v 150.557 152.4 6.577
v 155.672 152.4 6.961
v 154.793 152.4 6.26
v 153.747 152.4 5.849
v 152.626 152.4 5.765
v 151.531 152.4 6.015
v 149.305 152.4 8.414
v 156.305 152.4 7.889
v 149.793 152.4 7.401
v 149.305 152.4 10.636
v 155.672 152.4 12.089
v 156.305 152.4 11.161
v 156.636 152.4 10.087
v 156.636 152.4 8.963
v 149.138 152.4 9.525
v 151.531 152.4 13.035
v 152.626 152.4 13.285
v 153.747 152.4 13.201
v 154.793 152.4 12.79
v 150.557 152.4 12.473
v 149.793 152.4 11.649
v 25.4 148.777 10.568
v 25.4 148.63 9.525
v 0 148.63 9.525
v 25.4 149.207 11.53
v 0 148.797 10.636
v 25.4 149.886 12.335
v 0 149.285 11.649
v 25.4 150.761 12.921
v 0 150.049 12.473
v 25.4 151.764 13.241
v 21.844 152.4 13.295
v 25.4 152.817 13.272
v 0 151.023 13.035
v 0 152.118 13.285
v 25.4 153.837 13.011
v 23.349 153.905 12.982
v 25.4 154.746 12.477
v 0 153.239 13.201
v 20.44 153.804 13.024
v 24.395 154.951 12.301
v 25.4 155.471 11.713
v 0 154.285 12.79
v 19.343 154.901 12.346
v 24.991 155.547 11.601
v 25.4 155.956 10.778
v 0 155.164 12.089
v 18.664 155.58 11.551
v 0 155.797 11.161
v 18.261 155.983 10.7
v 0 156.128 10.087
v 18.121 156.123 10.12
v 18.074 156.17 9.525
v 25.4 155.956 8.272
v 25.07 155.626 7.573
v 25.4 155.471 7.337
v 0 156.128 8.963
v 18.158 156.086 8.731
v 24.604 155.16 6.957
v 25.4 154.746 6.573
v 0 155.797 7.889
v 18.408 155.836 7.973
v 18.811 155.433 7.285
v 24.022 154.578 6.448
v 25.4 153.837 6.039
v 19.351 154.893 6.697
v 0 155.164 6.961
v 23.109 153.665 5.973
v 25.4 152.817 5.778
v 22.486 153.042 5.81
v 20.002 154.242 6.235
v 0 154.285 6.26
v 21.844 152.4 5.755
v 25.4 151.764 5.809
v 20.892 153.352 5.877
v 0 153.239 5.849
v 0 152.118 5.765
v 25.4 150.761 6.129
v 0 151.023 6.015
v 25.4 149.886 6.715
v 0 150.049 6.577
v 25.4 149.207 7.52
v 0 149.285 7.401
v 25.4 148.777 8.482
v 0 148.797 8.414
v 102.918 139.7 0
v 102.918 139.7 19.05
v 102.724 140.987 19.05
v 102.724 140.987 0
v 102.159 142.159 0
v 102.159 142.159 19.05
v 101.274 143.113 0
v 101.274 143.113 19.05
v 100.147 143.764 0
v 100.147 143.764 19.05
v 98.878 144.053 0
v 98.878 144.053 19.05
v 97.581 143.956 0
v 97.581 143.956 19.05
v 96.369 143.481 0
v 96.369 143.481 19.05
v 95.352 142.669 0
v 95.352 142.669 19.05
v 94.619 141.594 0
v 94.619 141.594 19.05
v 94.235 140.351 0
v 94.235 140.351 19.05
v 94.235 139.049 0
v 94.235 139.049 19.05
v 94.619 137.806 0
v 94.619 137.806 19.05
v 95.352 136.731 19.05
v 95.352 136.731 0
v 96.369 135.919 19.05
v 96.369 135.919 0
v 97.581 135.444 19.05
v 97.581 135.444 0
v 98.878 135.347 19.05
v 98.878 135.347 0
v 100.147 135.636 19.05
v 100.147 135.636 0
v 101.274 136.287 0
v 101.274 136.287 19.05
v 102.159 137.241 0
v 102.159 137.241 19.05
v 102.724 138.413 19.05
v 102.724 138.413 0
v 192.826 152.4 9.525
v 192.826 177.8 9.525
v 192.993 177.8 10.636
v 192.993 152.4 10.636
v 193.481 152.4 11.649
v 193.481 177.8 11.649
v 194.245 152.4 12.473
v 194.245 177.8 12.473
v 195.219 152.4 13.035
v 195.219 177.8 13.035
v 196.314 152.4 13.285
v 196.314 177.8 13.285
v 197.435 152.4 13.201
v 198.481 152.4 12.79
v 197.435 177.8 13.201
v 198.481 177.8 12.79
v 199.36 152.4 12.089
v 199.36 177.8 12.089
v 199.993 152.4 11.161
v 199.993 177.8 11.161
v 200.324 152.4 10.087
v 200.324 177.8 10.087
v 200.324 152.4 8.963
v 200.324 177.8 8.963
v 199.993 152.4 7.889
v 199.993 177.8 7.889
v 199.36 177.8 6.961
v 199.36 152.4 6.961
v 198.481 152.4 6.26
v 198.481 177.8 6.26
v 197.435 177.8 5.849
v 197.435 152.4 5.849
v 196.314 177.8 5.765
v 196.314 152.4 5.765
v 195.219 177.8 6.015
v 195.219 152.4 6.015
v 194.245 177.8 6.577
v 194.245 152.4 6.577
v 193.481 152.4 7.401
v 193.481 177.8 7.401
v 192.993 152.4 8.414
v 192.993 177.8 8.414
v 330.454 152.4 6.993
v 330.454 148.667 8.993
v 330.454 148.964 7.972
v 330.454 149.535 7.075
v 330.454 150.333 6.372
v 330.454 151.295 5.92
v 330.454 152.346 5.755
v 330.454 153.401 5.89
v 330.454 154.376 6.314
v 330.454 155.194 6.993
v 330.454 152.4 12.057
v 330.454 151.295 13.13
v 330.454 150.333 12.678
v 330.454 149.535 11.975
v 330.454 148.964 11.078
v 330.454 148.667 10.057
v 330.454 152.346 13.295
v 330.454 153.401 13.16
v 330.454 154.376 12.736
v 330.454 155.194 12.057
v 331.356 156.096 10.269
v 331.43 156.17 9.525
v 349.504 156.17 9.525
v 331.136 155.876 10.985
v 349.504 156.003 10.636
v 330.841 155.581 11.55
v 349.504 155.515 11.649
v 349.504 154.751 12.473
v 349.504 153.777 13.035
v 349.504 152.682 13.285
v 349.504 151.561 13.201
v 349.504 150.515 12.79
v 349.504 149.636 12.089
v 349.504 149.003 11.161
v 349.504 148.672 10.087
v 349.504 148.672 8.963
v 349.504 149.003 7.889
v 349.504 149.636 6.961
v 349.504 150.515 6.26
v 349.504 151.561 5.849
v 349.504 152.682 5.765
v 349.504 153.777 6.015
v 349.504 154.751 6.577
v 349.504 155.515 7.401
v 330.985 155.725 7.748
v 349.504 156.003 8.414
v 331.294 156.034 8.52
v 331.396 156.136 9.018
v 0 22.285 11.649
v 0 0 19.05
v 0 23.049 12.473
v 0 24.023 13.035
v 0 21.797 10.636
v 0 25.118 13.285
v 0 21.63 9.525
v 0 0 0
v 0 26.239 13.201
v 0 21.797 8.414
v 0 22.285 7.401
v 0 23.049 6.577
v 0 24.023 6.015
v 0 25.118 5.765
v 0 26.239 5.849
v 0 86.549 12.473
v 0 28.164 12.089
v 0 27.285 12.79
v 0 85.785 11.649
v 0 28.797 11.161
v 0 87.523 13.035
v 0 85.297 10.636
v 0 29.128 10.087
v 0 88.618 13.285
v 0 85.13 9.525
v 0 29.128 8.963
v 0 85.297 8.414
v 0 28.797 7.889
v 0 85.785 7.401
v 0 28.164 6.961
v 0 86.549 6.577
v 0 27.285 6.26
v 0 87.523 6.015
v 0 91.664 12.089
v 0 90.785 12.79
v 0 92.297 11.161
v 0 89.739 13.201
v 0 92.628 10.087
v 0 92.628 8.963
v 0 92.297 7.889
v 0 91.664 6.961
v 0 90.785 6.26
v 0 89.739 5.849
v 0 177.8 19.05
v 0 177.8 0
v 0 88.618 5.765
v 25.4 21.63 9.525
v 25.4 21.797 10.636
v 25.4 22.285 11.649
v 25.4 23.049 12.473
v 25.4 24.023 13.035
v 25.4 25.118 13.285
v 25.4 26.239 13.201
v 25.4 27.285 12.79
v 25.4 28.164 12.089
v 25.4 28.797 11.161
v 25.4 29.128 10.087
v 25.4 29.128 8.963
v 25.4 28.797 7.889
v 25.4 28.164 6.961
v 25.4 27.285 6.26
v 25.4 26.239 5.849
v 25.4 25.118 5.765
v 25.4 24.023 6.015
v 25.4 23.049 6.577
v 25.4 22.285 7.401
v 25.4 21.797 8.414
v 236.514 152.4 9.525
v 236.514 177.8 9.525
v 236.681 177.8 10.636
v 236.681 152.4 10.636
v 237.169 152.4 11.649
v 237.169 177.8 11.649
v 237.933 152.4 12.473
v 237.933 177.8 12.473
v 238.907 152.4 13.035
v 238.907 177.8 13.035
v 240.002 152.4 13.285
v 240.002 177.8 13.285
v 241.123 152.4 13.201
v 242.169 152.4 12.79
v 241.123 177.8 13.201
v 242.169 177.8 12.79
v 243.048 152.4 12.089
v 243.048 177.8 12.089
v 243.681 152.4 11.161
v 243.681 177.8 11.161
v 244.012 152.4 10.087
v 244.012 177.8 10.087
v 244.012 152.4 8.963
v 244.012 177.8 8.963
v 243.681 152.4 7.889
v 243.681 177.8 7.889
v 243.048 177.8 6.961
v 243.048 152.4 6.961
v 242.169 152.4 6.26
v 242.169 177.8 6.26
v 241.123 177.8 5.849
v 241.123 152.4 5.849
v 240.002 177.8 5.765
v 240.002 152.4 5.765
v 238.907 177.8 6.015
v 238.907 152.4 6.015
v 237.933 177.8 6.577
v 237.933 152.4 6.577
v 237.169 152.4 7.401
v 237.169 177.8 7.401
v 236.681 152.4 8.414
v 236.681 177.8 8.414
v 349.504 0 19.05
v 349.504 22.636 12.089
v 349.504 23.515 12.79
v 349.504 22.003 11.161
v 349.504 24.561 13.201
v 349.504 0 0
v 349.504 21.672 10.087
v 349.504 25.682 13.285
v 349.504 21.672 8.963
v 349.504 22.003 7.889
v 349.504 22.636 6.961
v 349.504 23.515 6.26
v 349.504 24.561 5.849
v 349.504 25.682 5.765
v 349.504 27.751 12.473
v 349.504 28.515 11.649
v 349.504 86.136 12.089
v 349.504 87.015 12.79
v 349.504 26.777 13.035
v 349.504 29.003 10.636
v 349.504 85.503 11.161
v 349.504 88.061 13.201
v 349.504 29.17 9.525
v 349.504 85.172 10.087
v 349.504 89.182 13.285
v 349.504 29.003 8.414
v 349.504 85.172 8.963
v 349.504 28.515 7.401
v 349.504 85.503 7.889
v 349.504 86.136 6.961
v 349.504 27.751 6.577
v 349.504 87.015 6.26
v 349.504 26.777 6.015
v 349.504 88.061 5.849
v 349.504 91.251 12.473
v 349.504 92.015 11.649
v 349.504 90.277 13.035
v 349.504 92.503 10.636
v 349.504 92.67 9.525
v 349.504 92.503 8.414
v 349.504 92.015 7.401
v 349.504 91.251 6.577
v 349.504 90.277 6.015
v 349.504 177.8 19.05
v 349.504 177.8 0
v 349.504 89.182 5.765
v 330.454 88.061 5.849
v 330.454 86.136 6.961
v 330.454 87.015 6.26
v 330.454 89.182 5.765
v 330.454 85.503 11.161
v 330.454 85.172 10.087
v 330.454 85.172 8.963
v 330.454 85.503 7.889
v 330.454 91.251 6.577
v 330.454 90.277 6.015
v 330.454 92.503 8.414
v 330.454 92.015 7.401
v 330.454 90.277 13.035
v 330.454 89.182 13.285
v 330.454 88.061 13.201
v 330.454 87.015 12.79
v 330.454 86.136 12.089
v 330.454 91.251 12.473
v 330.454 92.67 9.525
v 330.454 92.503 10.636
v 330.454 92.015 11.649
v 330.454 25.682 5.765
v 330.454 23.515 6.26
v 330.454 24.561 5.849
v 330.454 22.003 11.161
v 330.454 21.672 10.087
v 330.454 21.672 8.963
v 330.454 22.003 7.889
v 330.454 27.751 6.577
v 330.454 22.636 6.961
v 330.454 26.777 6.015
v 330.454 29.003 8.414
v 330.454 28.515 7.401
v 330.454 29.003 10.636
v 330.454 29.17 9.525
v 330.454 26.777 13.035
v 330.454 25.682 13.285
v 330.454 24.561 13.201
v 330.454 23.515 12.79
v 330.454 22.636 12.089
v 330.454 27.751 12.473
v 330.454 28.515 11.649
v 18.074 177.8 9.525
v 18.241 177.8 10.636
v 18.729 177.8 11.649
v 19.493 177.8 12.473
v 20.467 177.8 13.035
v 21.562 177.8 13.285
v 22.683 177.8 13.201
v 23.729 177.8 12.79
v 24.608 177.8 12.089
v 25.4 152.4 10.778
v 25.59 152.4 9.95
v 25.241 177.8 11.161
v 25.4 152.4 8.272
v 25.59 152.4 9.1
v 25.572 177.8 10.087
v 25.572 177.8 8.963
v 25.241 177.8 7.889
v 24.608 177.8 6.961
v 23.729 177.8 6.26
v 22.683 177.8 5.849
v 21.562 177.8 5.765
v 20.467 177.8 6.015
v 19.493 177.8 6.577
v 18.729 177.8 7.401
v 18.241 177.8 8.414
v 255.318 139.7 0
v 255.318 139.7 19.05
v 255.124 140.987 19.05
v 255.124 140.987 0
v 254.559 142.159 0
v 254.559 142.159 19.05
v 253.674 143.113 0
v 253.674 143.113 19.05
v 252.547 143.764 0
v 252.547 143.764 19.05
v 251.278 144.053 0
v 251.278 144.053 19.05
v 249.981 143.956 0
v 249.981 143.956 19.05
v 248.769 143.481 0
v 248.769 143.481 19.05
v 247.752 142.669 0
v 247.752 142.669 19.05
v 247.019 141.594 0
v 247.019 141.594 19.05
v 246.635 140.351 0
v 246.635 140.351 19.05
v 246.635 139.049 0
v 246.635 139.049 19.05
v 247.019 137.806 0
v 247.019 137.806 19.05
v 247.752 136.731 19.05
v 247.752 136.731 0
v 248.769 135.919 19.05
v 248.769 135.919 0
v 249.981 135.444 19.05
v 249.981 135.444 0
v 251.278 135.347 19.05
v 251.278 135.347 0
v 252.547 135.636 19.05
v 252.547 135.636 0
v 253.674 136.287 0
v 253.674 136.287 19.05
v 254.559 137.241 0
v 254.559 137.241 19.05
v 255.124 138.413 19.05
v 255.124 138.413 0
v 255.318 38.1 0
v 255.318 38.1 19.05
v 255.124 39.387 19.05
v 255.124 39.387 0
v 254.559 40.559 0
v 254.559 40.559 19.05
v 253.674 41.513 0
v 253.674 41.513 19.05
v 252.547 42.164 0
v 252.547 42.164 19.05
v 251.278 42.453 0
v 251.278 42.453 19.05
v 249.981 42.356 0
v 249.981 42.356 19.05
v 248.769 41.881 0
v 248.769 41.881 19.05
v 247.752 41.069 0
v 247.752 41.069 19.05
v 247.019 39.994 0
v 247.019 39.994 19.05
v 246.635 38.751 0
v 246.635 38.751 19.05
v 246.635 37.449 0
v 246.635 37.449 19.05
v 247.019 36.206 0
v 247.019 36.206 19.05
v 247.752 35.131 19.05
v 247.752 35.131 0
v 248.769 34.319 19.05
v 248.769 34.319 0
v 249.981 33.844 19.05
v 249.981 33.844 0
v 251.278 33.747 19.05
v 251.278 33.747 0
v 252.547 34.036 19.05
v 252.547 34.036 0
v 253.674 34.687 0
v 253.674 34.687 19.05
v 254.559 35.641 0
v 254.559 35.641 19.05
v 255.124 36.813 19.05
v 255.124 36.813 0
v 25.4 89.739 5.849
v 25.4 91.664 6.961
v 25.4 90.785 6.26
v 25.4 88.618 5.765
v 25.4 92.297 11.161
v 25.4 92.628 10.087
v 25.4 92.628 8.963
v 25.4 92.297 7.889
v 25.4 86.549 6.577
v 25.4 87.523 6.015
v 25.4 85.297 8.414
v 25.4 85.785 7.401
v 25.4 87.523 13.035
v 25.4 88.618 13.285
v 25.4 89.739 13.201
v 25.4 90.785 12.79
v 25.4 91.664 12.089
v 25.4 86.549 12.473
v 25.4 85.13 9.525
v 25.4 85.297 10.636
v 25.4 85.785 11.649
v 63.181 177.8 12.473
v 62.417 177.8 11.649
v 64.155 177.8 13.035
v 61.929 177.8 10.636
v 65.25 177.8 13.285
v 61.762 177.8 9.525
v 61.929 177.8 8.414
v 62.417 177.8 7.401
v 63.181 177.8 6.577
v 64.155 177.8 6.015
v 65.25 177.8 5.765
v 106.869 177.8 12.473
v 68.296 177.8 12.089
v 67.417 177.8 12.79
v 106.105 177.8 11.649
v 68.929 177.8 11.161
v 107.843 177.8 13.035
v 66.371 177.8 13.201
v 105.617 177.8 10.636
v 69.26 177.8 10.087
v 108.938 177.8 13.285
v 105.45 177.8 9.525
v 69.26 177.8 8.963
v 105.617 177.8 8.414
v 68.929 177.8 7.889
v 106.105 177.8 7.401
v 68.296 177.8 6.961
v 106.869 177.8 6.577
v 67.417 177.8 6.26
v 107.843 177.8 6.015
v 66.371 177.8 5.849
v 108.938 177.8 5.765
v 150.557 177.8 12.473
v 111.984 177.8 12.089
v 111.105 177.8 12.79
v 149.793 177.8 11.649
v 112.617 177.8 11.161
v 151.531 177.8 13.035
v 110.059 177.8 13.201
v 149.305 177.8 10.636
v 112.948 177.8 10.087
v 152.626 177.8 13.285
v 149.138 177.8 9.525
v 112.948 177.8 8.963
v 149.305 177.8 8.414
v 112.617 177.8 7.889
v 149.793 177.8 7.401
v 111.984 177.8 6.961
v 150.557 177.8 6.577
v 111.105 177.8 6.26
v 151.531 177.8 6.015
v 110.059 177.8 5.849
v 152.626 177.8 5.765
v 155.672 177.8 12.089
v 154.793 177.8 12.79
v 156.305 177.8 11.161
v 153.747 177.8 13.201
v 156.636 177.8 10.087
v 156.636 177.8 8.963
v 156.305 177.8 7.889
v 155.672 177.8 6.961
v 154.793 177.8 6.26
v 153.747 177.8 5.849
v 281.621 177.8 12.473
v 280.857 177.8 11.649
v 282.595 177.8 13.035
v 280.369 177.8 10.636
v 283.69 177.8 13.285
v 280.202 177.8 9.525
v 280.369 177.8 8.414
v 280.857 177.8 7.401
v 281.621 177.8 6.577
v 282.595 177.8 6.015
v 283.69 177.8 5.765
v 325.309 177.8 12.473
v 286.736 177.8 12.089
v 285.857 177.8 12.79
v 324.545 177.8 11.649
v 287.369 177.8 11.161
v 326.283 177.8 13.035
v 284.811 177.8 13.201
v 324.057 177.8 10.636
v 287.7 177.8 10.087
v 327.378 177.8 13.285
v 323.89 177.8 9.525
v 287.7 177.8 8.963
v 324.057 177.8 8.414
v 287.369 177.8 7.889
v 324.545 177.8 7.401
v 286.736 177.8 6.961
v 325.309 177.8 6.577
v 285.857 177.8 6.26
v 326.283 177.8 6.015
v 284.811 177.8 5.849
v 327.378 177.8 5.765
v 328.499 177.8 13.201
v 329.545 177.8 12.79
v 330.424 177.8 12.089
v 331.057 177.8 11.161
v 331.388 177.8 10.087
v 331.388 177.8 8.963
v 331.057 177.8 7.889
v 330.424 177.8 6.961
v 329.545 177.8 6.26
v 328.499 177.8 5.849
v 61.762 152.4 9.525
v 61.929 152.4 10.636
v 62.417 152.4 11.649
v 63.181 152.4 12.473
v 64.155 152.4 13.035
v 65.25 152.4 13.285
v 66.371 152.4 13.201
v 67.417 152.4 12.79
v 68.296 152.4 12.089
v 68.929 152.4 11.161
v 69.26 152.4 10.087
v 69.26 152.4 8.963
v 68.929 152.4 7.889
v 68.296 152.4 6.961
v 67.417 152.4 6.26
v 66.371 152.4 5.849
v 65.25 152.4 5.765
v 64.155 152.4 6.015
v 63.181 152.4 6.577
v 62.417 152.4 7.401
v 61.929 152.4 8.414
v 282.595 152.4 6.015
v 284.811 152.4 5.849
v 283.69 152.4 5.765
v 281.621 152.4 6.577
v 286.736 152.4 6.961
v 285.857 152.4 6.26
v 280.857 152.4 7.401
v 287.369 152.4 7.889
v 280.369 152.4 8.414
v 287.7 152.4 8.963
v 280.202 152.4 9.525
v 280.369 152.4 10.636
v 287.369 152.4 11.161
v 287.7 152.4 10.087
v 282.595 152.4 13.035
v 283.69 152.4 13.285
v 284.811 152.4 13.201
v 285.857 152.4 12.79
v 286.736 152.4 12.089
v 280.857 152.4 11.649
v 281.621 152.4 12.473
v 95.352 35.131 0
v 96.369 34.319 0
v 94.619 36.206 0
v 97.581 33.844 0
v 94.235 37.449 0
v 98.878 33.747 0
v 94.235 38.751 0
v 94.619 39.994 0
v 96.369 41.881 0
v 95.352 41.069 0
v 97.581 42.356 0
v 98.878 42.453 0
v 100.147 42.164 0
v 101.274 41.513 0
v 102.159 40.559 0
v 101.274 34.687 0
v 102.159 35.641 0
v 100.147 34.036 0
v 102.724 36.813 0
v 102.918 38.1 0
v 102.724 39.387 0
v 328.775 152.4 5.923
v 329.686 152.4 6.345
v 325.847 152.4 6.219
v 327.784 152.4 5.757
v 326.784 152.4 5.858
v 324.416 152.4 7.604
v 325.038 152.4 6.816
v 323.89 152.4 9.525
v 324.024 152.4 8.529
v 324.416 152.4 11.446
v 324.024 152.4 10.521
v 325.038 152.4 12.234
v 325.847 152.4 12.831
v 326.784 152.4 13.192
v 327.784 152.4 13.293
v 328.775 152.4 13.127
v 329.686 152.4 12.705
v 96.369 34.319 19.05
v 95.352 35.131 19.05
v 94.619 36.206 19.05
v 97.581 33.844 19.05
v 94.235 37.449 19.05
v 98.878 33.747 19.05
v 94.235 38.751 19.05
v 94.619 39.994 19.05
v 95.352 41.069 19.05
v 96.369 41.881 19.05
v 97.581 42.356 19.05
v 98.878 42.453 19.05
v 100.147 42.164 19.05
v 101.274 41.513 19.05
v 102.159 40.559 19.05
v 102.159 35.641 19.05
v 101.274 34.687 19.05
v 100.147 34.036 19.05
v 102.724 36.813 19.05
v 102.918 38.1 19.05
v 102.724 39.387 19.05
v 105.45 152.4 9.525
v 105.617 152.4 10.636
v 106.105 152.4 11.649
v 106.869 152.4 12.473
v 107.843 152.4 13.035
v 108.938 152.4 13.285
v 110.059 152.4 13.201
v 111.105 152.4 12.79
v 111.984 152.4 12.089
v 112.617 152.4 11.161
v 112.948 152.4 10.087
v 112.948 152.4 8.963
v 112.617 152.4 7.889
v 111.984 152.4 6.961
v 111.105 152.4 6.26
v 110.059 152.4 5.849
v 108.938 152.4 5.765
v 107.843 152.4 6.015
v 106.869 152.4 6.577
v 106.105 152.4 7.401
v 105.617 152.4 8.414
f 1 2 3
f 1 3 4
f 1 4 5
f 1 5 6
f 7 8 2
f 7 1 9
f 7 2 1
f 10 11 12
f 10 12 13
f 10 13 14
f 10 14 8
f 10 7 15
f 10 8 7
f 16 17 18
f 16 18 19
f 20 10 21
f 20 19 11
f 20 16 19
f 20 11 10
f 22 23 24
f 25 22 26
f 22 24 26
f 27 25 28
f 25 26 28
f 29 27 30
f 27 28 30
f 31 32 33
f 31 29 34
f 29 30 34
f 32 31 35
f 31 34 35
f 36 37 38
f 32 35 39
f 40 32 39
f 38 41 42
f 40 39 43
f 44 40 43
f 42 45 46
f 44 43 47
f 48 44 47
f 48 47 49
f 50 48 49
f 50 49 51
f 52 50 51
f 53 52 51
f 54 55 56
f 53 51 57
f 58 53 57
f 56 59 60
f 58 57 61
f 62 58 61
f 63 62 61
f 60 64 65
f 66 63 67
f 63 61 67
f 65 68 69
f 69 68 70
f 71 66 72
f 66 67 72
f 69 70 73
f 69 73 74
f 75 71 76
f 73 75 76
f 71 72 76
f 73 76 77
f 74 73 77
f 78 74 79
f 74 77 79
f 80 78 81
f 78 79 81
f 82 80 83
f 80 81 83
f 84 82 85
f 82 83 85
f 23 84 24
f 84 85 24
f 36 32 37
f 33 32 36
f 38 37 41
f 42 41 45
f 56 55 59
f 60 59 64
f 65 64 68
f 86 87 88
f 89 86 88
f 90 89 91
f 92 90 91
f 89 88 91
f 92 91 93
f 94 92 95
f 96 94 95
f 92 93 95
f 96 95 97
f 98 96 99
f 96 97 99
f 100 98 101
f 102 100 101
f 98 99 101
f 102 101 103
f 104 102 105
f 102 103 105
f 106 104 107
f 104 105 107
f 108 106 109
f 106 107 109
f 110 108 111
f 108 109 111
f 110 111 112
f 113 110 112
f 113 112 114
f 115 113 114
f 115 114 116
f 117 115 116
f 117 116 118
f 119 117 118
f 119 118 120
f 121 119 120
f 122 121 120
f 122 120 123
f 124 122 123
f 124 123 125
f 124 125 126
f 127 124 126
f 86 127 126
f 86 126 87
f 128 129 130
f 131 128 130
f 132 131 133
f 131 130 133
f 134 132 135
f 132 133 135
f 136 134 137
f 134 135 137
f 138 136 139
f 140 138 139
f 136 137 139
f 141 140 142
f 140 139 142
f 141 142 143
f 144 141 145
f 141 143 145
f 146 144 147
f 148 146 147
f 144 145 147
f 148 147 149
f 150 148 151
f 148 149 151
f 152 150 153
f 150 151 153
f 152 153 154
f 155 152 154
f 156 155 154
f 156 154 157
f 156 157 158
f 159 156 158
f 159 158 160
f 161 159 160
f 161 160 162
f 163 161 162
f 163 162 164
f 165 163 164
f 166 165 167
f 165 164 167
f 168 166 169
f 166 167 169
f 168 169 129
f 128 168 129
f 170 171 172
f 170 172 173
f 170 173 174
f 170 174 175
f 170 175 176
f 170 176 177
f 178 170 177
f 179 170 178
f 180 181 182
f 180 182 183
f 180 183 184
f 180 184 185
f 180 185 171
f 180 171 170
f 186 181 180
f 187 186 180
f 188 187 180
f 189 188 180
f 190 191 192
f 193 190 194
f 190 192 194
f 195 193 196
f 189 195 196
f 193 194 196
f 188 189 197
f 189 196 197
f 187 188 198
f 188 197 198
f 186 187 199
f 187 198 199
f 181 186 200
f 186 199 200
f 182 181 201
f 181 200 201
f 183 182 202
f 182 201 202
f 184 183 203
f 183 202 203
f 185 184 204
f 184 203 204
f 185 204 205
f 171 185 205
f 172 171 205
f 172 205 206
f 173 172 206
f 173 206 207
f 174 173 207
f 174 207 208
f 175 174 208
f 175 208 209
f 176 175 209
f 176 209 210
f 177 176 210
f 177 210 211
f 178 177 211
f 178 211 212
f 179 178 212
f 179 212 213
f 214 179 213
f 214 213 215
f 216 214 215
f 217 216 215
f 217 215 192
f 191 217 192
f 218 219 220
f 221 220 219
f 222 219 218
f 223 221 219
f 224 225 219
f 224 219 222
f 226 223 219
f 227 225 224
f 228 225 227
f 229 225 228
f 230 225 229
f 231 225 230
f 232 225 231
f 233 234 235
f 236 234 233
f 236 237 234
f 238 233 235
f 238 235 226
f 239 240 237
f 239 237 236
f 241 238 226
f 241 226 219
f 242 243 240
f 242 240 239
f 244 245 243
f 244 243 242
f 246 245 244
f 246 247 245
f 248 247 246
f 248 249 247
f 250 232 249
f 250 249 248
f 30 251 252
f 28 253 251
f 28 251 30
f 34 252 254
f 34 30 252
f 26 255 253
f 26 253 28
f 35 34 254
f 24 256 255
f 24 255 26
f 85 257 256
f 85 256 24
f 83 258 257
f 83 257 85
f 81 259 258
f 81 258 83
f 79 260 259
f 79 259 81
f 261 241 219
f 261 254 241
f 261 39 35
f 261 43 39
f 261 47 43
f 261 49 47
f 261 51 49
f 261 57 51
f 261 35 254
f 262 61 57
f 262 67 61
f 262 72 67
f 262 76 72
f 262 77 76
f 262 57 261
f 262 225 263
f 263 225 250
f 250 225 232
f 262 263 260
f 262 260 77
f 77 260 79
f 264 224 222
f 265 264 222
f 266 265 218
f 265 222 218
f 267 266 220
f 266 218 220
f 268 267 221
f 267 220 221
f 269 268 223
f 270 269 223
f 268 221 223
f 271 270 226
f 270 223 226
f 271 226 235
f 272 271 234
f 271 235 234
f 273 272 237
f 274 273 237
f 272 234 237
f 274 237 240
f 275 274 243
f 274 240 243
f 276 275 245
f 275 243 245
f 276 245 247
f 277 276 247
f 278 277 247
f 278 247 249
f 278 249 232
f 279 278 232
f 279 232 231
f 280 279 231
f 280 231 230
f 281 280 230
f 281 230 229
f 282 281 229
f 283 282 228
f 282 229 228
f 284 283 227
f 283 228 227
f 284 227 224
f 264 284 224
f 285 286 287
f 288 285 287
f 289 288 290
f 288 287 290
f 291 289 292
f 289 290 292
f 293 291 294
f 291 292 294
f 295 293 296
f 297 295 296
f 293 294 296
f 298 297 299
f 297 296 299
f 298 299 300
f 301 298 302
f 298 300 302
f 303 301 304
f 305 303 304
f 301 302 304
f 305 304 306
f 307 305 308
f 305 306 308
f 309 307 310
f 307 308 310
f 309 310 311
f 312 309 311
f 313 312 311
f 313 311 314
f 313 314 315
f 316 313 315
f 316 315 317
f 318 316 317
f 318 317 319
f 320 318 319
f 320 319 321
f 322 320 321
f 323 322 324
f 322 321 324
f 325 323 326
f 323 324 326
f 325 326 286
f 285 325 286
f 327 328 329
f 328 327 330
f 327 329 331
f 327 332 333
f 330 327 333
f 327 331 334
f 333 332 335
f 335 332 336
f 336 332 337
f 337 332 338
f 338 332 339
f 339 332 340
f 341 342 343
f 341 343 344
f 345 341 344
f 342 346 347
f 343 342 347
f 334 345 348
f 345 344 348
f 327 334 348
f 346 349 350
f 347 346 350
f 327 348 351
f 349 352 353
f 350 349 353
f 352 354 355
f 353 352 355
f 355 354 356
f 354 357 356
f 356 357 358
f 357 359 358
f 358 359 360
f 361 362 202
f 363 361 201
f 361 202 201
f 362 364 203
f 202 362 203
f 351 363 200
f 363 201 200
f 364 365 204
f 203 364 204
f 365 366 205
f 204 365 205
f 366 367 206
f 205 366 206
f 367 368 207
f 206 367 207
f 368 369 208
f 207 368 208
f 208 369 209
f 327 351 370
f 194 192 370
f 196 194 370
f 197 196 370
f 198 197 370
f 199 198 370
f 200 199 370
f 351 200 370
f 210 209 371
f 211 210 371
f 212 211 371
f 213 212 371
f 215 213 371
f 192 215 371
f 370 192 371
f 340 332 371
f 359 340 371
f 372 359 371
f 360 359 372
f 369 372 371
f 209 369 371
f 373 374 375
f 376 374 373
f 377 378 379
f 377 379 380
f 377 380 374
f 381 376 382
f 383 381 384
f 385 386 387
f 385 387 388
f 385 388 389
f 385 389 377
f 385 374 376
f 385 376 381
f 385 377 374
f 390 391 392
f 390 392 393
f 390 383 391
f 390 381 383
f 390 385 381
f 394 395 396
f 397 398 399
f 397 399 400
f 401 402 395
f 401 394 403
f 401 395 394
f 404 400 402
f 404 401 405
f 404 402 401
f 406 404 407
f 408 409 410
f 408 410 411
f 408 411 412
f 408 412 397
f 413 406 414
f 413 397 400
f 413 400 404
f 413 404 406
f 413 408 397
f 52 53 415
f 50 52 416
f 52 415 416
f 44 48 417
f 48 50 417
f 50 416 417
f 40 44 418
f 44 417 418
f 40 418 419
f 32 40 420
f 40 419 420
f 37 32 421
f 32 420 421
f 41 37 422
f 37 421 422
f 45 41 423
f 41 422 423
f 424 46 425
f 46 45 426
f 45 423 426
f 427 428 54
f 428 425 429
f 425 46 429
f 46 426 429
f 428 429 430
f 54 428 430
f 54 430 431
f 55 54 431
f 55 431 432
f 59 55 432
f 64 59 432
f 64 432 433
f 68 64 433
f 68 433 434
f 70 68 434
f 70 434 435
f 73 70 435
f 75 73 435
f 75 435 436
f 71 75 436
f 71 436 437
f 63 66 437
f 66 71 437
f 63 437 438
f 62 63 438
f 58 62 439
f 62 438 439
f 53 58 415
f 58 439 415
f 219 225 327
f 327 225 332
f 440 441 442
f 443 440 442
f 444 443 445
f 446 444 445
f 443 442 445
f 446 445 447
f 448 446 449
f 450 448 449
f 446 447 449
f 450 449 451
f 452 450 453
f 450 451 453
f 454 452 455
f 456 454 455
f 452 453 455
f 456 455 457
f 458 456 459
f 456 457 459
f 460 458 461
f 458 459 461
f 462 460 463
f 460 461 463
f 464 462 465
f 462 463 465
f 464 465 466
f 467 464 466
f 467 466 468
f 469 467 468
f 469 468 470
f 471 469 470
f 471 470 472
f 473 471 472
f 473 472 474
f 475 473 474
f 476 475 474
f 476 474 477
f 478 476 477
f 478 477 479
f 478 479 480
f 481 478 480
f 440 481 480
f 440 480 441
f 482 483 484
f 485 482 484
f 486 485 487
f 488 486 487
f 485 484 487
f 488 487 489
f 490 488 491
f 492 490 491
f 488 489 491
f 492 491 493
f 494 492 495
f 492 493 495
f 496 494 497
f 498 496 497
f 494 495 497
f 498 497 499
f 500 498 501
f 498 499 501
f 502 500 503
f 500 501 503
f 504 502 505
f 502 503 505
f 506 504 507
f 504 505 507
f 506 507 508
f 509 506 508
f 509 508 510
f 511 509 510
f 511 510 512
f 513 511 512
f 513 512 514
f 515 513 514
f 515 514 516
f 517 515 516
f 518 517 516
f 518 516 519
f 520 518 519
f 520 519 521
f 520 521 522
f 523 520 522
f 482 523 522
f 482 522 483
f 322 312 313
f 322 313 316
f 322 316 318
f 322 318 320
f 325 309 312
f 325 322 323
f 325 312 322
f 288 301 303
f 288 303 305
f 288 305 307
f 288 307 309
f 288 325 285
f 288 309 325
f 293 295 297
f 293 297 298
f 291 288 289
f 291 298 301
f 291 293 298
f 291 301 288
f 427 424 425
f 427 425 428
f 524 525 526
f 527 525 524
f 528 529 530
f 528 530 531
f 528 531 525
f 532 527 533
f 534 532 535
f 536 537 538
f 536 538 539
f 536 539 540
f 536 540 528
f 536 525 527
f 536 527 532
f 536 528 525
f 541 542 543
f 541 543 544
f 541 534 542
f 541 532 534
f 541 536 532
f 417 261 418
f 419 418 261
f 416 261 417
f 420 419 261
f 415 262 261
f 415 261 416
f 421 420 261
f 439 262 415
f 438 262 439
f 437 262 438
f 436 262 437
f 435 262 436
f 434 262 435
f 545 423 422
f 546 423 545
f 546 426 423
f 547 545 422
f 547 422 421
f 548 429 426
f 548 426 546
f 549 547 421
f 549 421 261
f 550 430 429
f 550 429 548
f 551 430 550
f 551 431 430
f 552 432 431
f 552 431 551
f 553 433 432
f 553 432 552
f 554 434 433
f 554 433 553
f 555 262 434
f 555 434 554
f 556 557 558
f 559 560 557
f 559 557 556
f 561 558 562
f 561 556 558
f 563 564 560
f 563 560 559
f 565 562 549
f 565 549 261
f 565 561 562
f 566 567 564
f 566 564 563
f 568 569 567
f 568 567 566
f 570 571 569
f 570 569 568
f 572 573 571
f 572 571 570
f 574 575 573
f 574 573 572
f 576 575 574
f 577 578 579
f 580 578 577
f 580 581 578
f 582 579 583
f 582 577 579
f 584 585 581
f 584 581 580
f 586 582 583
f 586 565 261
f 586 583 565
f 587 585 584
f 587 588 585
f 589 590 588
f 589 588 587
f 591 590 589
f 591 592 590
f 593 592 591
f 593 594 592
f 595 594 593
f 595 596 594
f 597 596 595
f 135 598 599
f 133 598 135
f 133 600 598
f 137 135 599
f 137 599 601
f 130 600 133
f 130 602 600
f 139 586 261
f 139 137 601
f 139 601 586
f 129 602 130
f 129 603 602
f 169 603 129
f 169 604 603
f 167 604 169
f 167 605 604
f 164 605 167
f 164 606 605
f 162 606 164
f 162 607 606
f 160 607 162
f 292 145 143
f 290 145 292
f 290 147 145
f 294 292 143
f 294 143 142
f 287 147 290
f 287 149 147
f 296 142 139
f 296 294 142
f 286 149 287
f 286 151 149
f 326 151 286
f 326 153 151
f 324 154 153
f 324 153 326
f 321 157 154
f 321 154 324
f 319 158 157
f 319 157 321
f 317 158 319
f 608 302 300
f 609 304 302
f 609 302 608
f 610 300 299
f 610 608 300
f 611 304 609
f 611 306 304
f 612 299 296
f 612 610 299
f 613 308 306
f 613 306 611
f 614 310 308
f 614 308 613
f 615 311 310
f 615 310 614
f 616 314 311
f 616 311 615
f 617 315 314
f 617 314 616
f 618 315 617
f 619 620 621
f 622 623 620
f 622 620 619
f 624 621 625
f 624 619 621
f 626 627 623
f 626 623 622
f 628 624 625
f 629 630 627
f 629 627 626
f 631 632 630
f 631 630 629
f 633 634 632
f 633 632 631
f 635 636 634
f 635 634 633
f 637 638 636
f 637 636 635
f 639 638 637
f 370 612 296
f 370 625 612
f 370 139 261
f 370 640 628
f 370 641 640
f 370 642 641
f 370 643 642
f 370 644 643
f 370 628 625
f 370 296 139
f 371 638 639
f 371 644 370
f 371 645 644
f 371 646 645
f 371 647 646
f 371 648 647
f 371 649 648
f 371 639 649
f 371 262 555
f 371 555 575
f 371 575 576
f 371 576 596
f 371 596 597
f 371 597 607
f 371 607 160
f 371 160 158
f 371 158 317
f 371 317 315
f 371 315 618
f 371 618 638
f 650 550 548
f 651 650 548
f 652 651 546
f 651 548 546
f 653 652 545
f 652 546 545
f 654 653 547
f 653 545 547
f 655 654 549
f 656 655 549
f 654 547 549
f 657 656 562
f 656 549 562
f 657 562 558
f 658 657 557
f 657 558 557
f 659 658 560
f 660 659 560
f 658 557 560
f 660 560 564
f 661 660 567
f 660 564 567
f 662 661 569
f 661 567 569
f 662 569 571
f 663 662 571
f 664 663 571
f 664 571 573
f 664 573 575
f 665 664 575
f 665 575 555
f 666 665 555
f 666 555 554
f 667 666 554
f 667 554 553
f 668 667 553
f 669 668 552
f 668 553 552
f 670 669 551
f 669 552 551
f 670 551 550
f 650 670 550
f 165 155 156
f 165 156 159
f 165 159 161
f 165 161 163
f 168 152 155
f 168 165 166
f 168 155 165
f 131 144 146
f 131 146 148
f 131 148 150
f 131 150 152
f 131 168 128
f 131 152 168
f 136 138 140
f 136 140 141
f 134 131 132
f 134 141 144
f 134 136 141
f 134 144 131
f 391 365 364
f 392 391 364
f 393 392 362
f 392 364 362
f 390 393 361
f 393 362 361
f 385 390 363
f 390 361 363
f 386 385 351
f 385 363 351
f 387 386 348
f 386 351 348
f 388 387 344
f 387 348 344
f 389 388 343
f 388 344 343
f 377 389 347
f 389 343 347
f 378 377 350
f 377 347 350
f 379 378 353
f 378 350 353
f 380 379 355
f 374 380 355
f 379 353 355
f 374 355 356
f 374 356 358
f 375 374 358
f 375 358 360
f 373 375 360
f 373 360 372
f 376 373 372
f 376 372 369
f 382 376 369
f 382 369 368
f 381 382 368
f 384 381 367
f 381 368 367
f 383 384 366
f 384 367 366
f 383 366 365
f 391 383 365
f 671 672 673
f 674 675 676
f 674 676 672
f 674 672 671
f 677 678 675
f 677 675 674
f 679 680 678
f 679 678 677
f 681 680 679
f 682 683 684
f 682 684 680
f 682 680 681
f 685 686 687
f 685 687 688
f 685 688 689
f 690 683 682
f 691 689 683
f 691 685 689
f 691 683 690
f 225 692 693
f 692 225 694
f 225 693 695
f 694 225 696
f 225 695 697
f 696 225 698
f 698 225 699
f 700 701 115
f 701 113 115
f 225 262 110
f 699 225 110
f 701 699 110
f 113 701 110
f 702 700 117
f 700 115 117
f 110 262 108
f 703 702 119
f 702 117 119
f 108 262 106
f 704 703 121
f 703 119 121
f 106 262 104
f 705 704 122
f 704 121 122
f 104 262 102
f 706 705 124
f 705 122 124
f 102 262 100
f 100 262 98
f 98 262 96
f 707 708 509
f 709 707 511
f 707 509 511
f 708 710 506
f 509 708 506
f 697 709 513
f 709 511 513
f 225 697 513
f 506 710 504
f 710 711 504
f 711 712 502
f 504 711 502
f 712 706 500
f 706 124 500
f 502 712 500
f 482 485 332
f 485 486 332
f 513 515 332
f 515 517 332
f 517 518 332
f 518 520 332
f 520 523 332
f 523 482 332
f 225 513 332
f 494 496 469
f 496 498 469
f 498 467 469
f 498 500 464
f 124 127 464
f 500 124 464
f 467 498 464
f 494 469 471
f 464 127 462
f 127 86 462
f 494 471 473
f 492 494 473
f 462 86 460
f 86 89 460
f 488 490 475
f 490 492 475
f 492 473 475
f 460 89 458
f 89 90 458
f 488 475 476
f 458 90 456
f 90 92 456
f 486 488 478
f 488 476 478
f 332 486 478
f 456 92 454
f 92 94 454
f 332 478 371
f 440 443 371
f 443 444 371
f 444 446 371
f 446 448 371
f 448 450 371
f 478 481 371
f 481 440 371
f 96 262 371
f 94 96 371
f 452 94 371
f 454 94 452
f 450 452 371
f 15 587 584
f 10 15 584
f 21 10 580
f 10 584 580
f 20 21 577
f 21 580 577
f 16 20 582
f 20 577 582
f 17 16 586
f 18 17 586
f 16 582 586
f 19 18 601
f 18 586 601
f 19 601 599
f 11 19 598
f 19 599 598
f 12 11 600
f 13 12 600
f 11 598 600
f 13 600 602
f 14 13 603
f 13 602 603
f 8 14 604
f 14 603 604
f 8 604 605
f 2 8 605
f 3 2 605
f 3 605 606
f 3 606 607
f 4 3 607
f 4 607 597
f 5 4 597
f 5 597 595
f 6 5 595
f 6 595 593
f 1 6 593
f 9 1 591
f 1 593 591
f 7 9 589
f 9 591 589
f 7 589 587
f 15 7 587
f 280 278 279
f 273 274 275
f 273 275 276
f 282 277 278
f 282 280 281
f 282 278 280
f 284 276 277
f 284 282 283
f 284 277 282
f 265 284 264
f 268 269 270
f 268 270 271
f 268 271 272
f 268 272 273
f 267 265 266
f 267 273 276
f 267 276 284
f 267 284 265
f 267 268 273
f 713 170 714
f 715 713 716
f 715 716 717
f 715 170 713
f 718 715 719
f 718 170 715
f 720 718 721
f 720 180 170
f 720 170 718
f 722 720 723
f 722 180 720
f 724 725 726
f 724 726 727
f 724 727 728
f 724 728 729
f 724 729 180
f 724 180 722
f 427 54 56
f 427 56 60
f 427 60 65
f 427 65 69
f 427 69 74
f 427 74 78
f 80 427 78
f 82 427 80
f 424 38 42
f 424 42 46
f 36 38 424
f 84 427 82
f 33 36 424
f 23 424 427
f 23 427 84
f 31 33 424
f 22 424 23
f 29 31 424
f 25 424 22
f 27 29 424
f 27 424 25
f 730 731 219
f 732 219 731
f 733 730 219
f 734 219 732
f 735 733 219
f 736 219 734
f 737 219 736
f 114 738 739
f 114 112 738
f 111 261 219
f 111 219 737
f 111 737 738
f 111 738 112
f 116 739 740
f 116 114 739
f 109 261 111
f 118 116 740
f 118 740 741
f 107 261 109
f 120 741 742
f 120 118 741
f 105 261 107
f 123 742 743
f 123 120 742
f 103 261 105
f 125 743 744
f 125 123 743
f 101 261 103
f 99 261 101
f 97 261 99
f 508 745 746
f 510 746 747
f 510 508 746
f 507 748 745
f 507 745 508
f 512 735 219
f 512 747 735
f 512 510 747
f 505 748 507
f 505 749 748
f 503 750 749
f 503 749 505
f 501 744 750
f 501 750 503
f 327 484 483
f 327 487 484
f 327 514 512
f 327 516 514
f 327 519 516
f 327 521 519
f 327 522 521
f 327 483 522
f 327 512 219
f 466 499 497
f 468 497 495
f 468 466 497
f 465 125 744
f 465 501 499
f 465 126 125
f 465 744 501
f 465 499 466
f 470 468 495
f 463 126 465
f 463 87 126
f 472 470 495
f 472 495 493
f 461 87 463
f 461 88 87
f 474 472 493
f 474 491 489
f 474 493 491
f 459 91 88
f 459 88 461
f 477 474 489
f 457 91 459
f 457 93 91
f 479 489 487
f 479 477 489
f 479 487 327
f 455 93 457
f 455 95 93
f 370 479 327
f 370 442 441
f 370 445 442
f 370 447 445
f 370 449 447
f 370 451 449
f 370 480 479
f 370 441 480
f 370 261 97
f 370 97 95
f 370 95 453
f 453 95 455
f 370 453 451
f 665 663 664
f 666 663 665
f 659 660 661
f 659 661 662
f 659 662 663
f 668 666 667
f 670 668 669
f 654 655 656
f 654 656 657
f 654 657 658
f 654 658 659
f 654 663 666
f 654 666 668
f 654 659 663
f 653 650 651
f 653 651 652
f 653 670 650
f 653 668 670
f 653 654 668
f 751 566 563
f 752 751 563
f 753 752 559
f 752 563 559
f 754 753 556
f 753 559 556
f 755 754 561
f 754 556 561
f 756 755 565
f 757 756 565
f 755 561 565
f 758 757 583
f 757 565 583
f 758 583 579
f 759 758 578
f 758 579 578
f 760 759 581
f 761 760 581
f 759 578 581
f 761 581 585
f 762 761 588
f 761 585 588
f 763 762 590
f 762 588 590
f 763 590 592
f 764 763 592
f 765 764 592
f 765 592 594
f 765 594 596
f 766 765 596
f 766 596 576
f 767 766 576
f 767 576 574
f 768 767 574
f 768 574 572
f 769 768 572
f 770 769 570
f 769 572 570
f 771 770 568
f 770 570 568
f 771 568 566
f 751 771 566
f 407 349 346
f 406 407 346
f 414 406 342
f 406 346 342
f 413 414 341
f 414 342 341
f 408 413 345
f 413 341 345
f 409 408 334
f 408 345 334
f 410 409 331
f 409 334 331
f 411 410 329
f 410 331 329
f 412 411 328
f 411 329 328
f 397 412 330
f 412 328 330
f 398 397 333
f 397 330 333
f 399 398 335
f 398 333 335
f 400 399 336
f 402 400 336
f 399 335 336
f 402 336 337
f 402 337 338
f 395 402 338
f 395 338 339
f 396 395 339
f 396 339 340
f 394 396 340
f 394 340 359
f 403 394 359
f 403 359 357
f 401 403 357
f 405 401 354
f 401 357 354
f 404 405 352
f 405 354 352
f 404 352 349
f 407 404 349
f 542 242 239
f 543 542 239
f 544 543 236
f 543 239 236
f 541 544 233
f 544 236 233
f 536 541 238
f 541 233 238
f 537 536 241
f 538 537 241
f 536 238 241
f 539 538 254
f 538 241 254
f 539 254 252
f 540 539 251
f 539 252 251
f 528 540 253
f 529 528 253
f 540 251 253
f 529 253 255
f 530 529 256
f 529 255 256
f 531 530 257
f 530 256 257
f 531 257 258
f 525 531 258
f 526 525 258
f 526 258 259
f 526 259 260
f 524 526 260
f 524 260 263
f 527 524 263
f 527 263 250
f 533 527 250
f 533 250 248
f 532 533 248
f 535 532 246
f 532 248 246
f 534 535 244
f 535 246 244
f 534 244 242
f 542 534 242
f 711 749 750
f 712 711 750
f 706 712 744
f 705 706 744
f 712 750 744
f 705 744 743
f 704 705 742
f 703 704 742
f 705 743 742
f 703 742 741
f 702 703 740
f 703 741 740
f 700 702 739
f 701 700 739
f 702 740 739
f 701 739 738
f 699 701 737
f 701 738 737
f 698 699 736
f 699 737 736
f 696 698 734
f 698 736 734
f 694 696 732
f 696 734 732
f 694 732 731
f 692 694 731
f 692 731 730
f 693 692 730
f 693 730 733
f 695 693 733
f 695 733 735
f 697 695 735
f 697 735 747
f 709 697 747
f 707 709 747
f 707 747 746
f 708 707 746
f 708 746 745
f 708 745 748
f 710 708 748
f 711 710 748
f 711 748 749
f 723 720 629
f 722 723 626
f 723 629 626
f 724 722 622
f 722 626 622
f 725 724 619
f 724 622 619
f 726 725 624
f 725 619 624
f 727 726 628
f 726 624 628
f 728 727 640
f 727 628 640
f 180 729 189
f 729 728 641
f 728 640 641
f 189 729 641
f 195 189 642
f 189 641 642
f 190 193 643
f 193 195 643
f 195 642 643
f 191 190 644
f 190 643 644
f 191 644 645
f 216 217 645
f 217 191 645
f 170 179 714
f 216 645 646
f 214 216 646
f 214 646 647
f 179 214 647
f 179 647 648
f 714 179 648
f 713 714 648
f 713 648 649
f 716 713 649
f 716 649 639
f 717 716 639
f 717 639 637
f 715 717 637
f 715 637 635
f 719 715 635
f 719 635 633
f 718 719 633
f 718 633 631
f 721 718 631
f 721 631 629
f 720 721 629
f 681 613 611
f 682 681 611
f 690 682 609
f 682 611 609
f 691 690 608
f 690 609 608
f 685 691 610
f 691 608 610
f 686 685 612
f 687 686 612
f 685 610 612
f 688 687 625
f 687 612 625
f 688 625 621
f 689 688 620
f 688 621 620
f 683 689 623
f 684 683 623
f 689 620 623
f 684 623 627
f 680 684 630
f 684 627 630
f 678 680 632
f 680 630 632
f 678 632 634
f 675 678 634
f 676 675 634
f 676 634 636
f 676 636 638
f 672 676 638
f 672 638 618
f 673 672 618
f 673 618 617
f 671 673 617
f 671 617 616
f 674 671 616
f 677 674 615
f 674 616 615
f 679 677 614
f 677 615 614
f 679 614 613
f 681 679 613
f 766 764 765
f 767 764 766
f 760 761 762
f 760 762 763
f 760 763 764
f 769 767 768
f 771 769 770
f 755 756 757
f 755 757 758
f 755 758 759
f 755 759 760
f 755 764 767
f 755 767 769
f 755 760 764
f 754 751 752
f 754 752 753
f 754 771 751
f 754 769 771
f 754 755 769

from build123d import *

# Parameters (mm, degrees)
F0_W     = 349.504
F0_H     = 177.8
F1_DEPTH = 19.05
F2_R     = 3.770313
F3_DEPTH = 19.05
F4_R     = 3.770313
F5_DEPTH = 25.4
F6_R     = 4.365625
F7_DEPTH = 25.4
F8_R     = 3.770313
F9_DEPTH = 25.4


with BuildPart() as f1:
    # F0 (on Top) → F1 (new body)
    with BuildSketch(Plane.XY):
        with Locations((174.752, 88.9)):
            Rectangle(F0_W, F0_H)
    extrude(amount=F1_DEPTH)

    # F2 (on face) → F3 (cut)
    with BuildSketch(Plane.YZ.offset(349.504)):
        with Locations((88.9, 9.525)):
            Circle(F2_R)
        with Locations((25.4, 9.525)):
            Circle(F2_R)
        with Locations((152.4, 9.525)):
            Circle(F2_R)
    extrude(amount=-F3_DEPTH, mode=Mode.SUBTRACT)

    # F4 (on face) → F5 (cut)
    with BuildSketch(Plane(origin=(0, 0, 0), x_dir=(0, -1, 0), z_dir=(-1, 0, 0))):
        with Locations((-88.9, 9.525)):
            Circle(F4_R)
        with Locations((-25.4, 9.525)):
            Circle(F4_R)
        with Locations((-152.4, 9.525)):
            Circle(F4_R)
    extrude(amount=-F5_DEPTH, mode=Mode.SUBTRACT)

    # F6 (on face) → F7 (cut)
    with BuildSketch(Plane.XY.offset(19.05)):
        with Locations((98.552, 139.7)):
            Circle(F6_R)
        with Locations((98.552, 38.1)):
            Circle(F6_R)
        with Locations((250.952, 139.7)):
            Circle(F6_R)
        with Locations((250.952, 38.1)):
            Circle(F6_R)
    extrude(amount=-F7_DEPTH, mode=Mode.SUBTRACT)

    # F8 (on face) → F9 (cut)
    with BuildSketch(Plane(origin=(0, 177.8, 0), x_dir=(-1, 0, 0), z_dir=(0, 1, 0))):
        with Locations((-21.844, 9.525)):
            Circle(F8_R)
        with Locations((-65.532, 9.525)):
            Circle(F8_R)
        with Locations((-109.22, 9.525)):
            Circle(F8_R)
        with Locations((-152.908, 9.525)):
            Circle(F8_R)
        with Locations((-196.596, 9.525)):
            Circle(F8_R)
        with Locations((-240.284, 9.525)):
            Circle(F8_R)
        with Locations((-283.972, 9.525)):
            Circle(F8_R)
        with Locations((-327.66, 9.525)):
            Circle(F8_R)
    extrude(amount=-F9_DEPTH, mode=Mode.SUBTRACT)


solid = f1.part
